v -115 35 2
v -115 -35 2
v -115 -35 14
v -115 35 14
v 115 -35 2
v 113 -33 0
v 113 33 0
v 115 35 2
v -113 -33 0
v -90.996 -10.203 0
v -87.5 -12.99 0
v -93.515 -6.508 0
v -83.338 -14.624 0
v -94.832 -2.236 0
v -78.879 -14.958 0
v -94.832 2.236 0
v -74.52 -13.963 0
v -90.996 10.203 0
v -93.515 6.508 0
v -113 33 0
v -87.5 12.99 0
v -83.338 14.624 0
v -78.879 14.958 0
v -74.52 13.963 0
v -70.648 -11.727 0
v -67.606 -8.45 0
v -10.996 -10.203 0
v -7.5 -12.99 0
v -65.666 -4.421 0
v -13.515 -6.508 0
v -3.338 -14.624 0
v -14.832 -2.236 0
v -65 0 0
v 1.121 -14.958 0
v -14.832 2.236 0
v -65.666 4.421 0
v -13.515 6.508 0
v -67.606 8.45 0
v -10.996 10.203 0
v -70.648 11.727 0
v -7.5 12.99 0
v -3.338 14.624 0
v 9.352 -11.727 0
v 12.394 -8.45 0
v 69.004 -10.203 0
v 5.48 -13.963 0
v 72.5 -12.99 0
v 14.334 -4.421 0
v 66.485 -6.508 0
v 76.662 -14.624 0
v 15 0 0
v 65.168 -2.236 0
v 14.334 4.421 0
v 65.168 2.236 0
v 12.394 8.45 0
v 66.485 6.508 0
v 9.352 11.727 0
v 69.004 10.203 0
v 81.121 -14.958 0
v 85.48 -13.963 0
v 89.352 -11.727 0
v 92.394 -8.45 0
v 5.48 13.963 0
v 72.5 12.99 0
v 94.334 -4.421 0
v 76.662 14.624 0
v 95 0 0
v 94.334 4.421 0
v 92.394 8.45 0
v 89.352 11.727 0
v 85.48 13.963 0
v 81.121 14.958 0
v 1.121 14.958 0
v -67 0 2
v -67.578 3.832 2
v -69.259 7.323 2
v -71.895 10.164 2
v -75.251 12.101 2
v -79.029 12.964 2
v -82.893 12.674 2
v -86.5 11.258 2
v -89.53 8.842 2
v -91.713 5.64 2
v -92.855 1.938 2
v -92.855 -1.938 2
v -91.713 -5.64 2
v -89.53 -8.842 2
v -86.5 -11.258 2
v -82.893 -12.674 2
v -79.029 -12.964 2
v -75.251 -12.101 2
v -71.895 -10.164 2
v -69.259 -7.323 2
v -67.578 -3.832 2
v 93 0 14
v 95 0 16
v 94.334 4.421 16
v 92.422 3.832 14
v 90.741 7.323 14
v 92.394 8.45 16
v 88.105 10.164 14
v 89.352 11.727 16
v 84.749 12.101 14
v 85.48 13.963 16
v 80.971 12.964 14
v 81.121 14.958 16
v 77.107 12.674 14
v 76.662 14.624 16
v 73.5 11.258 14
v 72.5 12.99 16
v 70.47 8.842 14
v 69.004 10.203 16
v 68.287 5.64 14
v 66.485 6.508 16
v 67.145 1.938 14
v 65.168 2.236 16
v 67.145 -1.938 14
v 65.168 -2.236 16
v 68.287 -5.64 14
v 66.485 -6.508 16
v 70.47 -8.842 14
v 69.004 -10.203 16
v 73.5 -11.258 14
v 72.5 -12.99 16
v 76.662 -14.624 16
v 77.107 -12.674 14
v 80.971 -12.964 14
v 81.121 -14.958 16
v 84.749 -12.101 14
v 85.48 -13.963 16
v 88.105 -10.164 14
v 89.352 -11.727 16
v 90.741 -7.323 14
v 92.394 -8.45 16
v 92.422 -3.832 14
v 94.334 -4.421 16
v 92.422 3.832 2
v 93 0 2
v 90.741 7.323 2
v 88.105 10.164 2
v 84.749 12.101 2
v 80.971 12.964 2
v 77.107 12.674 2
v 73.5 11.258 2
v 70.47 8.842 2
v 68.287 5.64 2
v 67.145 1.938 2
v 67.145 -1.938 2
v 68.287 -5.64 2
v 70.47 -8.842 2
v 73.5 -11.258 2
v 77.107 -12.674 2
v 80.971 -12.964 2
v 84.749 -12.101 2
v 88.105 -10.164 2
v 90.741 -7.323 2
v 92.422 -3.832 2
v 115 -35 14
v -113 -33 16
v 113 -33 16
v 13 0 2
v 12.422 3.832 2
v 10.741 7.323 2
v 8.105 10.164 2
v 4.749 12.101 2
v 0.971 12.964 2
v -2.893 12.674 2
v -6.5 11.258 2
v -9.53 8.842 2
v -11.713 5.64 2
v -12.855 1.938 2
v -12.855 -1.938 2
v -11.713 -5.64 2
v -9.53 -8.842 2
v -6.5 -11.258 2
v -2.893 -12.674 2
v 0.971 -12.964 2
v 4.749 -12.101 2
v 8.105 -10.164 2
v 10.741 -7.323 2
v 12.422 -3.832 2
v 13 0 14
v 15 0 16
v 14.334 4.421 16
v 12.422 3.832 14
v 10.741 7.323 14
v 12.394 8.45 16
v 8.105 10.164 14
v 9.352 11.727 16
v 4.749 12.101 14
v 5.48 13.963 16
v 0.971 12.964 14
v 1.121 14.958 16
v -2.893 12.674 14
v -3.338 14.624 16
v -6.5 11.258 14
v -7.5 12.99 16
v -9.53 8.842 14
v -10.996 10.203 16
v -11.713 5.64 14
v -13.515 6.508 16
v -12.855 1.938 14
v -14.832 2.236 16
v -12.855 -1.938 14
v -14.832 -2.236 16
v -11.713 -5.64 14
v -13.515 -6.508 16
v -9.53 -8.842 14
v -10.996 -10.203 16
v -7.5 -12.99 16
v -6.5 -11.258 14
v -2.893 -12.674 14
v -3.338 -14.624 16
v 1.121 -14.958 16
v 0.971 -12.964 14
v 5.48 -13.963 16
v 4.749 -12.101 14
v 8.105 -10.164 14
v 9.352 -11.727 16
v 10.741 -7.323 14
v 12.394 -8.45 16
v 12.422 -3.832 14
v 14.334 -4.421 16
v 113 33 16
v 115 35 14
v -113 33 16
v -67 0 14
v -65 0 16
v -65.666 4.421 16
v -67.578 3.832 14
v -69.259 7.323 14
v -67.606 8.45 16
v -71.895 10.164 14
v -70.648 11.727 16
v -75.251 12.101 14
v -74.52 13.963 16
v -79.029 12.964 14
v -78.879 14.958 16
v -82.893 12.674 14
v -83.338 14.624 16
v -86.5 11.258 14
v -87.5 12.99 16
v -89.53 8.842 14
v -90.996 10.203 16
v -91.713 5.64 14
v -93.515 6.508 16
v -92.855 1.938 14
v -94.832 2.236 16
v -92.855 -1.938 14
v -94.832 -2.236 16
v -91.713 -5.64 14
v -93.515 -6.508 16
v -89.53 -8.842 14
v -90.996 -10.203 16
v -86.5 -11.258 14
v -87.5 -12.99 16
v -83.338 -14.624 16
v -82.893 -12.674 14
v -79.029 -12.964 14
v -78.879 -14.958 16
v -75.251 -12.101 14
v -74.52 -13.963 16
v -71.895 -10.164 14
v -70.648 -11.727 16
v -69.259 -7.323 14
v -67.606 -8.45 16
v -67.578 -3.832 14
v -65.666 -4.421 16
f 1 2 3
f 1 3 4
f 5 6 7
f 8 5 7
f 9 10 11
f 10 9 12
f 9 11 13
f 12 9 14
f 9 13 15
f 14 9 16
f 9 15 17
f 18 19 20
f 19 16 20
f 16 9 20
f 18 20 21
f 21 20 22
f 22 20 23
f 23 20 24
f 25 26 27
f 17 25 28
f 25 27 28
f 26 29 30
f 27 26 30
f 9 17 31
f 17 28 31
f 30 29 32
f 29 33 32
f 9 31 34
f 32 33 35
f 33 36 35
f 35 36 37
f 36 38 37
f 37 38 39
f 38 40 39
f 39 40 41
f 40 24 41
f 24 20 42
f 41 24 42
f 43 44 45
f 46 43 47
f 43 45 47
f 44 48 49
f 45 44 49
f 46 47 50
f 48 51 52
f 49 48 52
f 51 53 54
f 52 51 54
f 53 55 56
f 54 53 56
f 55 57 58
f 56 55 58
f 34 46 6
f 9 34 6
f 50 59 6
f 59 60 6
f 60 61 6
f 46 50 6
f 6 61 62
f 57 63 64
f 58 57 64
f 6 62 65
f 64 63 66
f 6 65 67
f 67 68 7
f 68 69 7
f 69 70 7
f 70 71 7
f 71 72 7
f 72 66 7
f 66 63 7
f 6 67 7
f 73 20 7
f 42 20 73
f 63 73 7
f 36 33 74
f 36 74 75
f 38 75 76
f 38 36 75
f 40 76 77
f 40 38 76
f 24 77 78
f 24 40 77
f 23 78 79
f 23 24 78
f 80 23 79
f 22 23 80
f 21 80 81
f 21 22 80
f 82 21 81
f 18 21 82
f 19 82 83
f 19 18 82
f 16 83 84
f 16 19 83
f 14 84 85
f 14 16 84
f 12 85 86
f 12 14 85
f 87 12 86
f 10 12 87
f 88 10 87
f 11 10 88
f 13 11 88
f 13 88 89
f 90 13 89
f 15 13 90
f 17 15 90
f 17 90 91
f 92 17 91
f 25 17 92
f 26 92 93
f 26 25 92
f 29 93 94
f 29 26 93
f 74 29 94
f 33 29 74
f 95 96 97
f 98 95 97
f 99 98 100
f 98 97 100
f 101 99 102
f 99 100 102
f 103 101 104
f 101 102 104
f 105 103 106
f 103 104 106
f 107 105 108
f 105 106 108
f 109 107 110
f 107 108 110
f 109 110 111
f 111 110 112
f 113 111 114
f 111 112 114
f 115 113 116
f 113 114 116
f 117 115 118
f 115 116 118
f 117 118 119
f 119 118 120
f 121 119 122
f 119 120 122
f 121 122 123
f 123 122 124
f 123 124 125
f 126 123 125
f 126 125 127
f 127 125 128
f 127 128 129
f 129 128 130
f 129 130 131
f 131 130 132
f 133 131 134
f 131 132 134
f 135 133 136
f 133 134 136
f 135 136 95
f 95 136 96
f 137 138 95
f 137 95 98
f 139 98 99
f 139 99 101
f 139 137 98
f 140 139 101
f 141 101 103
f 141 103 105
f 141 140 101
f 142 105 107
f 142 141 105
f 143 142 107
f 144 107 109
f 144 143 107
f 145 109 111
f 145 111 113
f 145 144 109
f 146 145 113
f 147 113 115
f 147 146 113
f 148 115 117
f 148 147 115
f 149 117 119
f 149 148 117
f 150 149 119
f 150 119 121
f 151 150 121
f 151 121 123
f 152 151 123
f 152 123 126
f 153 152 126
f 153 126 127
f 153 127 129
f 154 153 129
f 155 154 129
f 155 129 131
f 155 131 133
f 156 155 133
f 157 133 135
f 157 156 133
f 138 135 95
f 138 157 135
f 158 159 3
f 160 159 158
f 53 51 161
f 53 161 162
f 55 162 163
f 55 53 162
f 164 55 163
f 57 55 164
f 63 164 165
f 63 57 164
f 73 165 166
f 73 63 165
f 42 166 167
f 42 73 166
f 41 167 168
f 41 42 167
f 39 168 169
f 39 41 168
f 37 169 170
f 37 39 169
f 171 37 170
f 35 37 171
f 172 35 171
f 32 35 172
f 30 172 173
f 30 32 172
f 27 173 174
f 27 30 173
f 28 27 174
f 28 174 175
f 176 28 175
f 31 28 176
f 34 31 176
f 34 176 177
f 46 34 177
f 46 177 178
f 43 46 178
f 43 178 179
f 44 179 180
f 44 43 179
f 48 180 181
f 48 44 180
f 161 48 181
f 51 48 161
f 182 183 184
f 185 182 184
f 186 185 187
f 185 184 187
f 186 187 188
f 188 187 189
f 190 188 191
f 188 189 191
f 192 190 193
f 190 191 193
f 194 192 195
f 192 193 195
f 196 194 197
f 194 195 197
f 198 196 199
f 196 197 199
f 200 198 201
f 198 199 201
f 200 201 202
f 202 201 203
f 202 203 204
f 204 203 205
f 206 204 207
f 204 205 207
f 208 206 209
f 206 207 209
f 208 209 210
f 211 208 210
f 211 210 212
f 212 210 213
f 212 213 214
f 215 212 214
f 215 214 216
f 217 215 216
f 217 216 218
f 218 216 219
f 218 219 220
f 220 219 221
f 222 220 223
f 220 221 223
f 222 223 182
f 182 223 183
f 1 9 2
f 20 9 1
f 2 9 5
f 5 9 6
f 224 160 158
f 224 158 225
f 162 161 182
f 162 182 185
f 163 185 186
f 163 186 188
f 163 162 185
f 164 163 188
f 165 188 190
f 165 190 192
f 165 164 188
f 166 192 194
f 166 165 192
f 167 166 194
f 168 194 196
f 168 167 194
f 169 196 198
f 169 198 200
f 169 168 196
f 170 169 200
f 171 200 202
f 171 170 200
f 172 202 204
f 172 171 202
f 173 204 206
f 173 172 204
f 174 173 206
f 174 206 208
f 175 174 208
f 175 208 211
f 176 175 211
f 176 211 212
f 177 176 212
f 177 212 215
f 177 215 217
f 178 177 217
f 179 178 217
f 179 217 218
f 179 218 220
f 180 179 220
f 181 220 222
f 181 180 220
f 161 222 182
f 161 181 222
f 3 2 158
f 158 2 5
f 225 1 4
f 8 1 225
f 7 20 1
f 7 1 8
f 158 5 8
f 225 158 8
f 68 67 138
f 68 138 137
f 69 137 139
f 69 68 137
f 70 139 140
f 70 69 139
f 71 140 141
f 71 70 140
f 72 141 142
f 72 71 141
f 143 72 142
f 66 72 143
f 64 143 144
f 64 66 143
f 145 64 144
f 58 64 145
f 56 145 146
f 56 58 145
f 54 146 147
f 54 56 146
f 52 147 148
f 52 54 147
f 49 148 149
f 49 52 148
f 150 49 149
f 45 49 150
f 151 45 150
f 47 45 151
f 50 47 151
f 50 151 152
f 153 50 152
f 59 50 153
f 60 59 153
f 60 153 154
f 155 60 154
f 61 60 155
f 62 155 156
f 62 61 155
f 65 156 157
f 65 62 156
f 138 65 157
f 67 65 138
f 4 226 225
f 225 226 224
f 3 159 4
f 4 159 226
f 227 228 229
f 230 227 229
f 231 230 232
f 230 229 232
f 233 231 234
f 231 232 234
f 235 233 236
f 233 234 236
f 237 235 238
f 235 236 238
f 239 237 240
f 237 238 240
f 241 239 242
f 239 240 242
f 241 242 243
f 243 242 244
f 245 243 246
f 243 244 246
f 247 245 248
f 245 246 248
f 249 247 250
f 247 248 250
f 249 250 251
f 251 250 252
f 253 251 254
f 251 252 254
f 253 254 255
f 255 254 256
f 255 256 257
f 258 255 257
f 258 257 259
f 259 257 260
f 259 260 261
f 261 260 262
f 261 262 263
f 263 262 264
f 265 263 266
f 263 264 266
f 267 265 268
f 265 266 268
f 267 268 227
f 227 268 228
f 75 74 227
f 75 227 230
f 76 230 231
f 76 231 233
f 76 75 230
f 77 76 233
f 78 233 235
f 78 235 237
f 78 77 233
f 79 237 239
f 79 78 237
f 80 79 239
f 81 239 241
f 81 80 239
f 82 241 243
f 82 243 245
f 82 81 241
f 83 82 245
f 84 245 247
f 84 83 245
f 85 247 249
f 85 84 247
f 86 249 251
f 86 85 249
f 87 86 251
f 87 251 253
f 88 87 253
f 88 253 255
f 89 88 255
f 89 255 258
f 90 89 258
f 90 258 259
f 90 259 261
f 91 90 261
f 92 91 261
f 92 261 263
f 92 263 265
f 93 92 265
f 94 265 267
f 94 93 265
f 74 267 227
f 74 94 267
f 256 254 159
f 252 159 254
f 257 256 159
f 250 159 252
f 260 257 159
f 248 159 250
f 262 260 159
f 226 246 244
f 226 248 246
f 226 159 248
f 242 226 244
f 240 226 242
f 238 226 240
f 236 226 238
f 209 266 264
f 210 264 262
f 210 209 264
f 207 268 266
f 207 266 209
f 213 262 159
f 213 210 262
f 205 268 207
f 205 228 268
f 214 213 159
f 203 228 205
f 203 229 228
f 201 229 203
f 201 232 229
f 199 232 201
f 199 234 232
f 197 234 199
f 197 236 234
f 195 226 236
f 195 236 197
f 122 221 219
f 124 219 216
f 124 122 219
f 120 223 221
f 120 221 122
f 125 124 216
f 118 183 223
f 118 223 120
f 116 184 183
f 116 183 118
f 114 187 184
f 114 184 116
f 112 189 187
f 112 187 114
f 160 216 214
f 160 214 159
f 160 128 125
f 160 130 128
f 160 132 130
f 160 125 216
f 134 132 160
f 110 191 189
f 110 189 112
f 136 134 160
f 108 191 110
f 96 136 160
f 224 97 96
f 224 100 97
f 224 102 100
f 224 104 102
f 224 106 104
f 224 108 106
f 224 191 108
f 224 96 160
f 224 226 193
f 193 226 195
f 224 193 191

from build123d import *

# Parameters (mm, degrees)
SKETCH_1_W        = 230
SKETCH_1_H        = 70
SKETCH_1_R        = 13
EXTRUDE_365_DEPTH = 16
CHAMFER_1_SIZE    = 2


with BuildPart() as part:
    # 草图1 → Extrude 365 (new body)
    with BuildSketch(Plane.XY):
        Rectangle(SKETCH_1_W, SKETCH_1_H)
        Circle(SKETCH_1_R, mode=Mode.SUBTRACT)
        with Locations((80, 0)):
            Circle(SKETCH_1_R, mode=Mode.SUBTRACT)
        with Locations((-80, 0)):
            Circle(SKETCH_1_R, mode=Mode.SUBTRACT)
    extrude(amount=EXTRUDE_365_DEPTH)

    # 倒角1
    chamfer_1_edges = [part.edges().sort_by_distance(p)[0] for p in [
        (115, 0, 16),
        (-13, 0, 0),
        (-13, 0, 16),
        (0, 35, 16),
        (67, 0, 0),
        (67, 0, 16),
        (-93, 0, 0),
        (-93, 0, 16),
        (-115, 0, 16),
        (0, 35, 0),
        (115, 0, 0),
        (0, -35, 0),
        (-115, 0, 0),
        (0, -35, 16),
    ]]
    chamfer(chamfer_1_edges, length=CHAMFER_1_SIZE)


solid = part.part
